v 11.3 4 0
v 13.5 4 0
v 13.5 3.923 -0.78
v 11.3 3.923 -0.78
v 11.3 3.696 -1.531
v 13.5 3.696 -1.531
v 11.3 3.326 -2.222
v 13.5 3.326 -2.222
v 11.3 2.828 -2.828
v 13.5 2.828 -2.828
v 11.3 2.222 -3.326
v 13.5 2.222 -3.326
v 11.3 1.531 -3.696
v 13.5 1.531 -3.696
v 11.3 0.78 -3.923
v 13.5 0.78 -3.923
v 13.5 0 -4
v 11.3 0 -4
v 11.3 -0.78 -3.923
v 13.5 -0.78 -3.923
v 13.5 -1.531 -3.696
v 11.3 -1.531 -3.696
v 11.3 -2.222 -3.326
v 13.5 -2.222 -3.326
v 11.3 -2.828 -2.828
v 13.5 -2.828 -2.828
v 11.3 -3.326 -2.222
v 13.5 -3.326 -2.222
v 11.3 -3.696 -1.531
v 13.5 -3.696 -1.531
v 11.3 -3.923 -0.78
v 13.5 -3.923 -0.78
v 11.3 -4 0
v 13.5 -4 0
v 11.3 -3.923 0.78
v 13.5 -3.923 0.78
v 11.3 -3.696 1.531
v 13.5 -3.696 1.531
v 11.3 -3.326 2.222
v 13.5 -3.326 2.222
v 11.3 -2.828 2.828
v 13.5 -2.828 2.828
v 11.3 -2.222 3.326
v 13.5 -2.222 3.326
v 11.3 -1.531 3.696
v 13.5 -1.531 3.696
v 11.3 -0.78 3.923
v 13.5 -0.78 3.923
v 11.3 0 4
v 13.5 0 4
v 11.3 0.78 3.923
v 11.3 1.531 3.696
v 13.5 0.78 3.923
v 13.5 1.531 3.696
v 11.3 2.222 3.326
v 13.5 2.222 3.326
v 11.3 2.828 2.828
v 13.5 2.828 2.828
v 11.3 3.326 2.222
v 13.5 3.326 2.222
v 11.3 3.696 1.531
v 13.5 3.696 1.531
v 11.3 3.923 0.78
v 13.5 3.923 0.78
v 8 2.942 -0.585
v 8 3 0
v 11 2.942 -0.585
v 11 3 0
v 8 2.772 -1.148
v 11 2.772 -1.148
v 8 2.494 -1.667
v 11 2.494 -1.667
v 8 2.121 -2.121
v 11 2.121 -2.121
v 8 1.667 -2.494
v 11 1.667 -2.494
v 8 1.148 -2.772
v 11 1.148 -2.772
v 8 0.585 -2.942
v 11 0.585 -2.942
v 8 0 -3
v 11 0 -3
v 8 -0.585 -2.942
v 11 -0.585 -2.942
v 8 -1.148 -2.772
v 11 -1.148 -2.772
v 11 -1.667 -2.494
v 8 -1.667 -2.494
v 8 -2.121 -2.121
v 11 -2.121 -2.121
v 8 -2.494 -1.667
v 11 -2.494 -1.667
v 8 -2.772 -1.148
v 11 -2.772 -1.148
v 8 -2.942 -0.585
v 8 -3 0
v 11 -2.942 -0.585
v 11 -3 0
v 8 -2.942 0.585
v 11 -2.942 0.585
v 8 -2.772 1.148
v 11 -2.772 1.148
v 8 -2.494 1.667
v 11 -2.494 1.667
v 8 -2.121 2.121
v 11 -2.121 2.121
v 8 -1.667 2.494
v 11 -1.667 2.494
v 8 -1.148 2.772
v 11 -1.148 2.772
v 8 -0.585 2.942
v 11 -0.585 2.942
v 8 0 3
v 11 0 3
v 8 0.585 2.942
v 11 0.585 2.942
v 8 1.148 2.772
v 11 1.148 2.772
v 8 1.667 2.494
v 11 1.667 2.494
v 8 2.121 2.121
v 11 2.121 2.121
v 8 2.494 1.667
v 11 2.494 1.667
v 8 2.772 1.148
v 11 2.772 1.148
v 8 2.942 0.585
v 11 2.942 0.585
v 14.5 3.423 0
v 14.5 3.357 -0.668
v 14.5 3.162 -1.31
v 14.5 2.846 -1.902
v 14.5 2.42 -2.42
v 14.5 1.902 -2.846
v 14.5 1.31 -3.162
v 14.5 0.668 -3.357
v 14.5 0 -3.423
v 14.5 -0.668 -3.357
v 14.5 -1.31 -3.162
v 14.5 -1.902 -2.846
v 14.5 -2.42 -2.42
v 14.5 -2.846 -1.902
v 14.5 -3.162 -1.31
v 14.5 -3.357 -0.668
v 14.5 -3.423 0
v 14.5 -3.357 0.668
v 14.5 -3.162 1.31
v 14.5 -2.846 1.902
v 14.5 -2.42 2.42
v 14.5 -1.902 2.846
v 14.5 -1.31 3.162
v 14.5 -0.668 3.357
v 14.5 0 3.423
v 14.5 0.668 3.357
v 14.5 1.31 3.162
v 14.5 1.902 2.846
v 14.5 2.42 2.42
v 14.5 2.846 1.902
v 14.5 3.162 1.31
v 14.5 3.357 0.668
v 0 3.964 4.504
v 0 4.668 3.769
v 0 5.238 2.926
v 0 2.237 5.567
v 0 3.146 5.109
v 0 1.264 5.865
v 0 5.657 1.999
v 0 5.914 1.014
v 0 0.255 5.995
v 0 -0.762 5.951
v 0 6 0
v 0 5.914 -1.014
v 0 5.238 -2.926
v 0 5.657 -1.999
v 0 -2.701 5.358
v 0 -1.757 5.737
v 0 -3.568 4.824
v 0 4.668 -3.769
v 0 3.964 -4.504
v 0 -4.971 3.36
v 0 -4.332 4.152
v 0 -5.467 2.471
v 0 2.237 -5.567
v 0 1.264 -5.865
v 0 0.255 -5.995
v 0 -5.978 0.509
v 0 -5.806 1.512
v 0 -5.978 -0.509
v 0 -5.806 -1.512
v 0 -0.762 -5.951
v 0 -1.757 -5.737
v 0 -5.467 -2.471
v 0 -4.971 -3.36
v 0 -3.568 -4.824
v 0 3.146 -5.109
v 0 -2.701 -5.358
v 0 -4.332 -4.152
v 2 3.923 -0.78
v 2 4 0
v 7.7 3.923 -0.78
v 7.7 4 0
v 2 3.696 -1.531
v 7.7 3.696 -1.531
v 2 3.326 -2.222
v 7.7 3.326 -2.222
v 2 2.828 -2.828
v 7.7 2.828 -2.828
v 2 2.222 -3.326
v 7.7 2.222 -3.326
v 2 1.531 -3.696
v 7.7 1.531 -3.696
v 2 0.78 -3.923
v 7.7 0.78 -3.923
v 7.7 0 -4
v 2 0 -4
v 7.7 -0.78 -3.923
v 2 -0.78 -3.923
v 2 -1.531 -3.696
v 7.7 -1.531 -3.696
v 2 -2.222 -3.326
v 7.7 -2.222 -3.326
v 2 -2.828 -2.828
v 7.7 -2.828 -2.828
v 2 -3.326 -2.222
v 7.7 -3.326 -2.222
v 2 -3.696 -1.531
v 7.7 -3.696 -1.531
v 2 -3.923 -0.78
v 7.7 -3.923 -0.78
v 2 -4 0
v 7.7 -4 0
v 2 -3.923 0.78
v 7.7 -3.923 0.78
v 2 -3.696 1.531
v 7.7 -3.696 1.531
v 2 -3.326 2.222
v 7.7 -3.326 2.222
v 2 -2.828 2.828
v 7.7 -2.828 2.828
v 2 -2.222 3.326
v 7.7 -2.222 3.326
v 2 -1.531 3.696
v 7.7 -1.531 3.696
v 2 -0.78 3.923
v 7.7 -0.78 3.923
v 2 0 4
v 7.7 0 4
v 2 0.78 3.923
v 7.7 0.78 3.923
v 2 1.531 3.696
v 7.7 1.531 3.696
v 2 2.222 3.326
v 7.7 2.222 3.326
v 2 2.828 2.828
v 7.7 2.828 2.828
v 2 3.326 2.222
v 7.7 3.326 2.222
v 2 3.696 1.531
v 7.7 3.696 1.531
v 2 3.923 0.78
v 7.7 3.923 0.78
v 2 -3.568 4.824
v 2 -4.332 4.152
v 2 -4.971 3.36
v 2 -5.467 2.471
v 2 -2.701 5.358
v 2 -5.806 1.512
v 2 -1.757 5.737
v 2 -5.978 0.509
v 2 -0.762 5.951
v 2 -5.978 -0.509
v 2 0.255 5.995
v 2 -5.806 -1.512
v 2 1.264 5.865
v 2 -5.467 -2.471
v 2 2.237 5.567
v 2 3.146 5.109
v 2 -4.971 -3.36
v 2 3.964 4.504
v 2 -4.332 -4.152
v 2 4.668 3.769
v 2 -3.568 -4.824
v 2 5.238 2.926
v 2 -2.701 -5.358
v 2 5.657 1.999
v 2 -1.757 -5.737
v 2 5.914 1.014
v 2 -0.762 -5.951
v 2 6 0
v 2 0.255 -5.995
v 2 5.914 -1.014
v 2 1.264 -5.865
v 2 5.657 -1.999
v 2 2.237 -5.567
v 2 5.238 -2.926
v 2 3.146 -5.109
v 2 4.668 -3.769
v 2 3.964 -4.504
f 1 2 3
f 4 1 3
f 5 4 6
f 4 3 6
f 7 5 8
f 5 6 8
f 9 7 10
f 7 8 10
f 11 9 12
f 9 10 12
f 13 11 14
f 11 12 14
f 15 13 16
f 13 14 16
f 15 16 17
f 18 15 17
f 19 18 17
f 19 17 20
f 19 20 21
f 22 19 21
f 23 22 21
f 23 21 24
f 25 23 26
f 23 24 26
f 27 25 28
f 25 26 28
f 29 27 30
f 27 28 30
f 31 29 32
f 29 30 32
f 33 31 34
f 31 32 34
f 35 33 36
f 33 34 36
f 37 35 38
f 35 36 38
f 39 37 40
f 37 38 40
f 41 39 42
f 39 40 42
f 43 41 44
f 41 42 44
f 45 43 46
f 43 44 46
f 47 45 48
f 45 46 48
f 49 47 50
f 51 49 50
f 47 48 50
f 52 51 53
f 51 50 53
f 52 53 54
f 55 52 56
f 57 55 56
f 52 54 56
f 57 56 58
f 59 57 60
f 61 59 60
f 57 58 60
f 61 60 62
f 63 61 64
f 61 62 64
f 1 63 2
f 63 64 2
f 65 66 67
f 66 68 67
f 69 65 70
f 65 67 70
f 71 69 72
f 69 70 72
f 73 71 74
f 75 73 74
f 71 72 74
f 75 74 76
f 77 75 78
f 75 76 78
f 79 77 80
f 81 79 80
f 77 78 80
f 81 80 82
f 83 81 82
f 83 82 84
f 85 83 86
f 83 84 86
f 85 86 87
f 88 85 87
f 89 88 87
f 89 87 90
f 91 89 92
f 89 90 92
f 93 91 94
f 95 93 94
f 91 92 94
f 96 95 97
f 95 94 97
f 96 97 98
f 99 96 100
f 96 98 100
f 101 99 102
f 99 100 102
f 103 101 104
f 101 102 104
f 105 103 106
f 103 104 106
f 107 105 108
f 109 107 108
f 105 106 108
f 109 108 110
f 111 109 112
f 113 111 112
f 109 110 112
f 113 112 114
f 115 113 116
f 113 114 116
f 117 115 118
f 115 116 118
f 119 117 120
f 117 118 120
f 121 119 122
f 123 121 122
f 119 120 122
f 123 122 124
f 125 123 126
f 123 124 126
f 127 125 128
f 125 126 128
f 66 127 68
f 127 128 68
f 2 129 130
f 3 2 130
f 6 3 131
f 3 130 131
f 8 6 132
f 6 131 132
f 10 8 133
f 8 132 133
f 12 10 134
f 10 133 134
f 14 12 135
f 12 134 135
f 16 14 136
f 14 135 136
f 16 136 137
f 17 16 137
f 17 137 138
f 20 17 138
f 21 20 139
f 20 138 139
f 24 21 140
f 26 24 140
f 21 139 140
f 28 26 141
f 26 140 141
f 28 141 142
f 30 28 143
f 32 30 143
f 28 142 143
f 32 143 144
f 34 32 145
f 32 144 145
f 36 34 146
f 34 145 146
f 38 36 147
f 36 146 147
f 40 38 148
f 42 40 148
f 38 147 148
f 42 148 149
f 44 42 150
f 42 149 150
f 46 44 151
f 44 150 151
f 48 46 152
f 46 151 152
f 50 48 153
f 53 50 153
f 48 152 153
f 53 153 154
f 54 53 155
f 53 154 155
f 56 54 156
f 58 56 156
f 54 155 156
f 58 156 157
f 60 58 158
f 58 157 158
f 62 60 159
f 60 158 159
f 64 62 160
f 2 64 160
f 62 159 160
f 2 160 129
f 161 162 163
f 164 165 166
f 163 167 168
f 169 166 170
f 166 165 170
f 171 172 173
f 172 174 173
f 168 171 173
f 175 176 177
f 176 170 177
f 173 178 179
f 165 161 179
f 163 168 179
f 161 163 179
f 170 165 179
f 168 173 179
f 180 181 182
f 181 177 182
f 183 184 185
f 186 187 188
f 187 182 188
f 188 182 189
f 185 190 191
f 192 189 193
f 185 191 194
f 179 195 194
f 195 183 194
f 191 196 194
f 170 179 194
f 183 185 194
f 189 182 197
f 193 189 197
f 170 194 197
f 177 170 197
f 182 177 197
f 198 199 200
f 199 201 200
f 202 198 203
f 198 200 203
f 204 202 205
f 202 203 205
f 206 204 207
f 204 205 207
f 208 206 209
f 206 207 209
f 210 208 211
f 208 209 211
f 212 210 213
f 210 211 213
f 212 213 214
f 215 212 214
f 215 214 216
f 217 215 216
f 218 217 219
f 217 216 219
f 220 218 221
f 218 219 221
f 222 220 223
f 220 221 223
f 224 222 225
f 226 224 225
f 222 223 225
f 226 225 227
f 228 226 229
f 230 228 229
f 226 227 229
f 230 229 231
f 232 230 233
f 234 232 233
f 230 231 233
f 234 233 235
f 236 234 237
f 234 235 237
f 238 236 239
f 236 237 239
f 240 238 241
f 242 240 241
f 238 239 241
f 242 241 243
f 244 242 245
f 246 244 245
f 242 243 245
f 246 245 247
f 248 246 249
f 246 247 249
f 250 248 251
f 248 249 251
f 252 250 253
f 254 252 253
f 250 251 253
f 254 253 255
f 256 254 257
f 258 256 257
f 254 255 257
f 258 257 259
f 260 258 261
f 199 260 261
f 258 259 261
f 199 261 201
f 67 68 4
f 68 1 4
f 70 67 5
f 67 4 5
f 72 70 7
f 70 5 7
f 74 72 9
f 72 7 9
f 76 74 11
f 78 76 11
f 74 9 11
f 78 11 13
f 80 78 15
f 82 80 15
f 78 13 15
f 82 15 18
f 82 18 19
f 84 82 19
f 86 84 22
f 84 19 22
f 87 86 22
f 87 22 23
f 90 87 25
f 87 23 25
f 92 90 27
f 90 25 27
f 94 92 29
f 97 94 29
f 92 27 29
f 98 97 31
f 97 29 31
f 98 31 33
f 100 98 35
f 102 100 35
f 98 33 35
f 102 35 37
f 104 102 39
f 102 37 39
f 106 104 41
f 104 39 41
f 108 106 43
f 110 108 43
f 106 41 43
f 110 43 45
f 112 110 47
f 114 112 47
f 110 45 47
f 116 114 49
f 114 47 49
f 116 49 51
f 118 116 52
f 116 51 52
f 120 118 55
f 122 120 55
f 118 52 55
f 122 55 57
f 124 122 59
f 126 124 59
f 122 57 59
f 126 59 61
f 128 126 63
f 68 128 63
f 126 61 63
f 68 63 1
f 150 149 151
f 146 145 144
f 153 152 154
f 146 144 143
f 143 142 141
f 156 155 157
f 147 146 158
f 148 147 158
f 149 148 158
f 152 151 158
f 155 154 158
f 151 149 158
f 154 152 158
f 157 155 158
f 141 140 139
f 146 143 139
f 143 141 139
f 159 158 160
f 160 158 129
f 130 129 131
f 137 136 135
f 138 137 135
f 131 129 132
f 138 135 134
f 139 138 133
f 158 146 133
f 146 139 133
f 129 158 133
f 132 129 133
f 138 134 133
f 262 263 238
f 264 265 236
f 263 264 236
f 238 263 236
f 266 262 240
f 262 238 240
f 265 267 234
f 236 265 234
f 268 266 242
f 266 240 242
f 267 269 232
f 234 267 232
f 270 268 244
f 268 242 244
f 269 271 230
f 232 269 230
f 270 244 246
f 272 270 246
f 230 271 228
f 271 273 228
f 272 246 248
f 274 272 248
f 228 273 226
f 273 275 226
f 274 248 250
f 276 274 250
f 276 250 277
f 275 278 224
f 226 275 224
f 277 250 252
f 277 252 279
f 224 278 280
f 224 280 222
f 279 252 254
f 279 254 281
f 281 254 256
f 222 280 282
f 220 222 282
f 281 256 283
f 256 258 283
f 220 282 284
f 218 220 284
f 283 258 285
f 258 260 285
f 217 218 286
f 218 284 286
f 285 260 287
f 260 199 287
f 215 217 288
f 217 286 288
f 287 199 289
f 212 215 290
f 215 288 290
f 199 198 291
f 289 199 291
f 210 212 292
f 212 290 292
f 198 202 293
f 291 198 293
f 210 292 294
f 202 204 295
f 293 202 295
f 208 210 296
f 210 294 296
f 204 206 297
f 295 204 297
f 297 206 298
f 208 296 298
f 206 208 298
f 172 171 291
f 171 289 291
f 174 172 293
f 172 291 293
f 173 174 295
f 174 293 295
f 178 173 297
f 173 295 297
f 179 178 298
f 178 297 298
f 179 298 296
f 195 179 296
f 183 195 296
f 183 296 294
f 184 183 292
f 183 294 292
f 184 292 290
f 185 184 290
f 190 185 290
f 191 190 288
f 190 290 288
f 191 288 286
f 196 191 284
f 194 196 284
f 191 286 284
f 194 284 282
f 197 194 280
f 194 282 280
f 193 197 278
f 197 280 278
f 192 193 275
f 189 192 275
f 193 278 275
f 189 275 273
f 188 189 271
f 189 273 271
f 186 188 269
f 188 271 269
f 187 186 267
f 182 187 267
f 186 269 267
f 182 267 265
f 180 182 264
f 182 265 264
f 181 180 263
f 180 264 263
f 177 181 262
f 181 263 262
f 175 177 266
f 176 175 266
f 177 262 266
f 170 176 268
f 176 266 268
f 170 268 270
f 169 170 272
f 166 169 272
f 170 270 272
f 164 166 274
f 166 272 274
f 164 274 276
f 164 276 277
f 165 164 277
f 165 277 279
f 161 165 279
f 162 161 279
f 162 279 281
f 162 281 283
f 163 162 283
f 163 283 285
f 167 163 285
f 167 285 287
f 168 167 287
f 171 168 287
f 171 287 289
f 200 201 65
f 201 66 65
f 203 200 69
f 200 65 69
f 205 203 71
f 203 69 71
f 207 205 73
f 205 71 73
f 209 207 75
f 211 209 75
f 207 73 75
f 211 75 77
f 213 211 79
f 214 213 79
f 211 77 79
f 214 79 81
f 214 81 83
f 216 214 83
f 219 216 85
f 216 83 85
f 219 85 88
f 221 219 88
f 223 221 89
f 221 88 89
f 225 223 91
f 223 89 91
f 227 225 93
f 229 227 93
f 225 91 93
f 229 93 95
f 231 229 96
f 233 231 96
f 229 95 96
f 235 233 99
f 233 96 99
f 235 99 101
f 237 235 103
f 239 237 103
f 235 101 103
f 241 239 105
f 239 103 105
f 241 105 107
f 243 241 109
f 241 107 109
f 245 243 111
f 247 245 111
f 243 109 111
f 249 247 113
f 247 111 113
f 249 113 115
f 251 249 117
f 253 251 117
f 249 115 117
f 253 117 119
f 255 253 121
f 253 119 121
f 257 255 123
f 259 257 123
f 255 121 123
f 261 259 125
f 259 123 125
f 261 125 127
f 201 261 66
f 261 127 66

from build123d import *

# Parameters (mm, degrees)
CHAMFER1_SIZE  = 1
CHAMFER1_SIZE2 = 0.577350269


with BuildPart() as part:
    # Sketch1 → Revolve1 (revolve)
    with BuildSketch(Plane.XY):
        Polygon((0, 0), (0, 6), (2, 6), (2, 4), (7.7, 4), (8, 3), (11, 3), (11.3, 4), (14.5, 4), (14.5, 0), align=None)
    revolve(axis=Axis((14.5, 0, 0), (-1, 0, 0)))

    # Chamfer1
    chamfer1_edges = [part.edges().sort_by_distance(p)[0] for p in [
        (14.5, -4, 0),
    ]]
    chamfer1_side = [part.faces().sort_by_distance(p)[0] for p in [
        (12.9, -4, 0),
    ]]
    chamfer(chamfer1_edges, length=CHAMFER1_SIZE, length2=CHAMFER1_SIZE2, reference=chamfer1_side[0])


solid = part.part
